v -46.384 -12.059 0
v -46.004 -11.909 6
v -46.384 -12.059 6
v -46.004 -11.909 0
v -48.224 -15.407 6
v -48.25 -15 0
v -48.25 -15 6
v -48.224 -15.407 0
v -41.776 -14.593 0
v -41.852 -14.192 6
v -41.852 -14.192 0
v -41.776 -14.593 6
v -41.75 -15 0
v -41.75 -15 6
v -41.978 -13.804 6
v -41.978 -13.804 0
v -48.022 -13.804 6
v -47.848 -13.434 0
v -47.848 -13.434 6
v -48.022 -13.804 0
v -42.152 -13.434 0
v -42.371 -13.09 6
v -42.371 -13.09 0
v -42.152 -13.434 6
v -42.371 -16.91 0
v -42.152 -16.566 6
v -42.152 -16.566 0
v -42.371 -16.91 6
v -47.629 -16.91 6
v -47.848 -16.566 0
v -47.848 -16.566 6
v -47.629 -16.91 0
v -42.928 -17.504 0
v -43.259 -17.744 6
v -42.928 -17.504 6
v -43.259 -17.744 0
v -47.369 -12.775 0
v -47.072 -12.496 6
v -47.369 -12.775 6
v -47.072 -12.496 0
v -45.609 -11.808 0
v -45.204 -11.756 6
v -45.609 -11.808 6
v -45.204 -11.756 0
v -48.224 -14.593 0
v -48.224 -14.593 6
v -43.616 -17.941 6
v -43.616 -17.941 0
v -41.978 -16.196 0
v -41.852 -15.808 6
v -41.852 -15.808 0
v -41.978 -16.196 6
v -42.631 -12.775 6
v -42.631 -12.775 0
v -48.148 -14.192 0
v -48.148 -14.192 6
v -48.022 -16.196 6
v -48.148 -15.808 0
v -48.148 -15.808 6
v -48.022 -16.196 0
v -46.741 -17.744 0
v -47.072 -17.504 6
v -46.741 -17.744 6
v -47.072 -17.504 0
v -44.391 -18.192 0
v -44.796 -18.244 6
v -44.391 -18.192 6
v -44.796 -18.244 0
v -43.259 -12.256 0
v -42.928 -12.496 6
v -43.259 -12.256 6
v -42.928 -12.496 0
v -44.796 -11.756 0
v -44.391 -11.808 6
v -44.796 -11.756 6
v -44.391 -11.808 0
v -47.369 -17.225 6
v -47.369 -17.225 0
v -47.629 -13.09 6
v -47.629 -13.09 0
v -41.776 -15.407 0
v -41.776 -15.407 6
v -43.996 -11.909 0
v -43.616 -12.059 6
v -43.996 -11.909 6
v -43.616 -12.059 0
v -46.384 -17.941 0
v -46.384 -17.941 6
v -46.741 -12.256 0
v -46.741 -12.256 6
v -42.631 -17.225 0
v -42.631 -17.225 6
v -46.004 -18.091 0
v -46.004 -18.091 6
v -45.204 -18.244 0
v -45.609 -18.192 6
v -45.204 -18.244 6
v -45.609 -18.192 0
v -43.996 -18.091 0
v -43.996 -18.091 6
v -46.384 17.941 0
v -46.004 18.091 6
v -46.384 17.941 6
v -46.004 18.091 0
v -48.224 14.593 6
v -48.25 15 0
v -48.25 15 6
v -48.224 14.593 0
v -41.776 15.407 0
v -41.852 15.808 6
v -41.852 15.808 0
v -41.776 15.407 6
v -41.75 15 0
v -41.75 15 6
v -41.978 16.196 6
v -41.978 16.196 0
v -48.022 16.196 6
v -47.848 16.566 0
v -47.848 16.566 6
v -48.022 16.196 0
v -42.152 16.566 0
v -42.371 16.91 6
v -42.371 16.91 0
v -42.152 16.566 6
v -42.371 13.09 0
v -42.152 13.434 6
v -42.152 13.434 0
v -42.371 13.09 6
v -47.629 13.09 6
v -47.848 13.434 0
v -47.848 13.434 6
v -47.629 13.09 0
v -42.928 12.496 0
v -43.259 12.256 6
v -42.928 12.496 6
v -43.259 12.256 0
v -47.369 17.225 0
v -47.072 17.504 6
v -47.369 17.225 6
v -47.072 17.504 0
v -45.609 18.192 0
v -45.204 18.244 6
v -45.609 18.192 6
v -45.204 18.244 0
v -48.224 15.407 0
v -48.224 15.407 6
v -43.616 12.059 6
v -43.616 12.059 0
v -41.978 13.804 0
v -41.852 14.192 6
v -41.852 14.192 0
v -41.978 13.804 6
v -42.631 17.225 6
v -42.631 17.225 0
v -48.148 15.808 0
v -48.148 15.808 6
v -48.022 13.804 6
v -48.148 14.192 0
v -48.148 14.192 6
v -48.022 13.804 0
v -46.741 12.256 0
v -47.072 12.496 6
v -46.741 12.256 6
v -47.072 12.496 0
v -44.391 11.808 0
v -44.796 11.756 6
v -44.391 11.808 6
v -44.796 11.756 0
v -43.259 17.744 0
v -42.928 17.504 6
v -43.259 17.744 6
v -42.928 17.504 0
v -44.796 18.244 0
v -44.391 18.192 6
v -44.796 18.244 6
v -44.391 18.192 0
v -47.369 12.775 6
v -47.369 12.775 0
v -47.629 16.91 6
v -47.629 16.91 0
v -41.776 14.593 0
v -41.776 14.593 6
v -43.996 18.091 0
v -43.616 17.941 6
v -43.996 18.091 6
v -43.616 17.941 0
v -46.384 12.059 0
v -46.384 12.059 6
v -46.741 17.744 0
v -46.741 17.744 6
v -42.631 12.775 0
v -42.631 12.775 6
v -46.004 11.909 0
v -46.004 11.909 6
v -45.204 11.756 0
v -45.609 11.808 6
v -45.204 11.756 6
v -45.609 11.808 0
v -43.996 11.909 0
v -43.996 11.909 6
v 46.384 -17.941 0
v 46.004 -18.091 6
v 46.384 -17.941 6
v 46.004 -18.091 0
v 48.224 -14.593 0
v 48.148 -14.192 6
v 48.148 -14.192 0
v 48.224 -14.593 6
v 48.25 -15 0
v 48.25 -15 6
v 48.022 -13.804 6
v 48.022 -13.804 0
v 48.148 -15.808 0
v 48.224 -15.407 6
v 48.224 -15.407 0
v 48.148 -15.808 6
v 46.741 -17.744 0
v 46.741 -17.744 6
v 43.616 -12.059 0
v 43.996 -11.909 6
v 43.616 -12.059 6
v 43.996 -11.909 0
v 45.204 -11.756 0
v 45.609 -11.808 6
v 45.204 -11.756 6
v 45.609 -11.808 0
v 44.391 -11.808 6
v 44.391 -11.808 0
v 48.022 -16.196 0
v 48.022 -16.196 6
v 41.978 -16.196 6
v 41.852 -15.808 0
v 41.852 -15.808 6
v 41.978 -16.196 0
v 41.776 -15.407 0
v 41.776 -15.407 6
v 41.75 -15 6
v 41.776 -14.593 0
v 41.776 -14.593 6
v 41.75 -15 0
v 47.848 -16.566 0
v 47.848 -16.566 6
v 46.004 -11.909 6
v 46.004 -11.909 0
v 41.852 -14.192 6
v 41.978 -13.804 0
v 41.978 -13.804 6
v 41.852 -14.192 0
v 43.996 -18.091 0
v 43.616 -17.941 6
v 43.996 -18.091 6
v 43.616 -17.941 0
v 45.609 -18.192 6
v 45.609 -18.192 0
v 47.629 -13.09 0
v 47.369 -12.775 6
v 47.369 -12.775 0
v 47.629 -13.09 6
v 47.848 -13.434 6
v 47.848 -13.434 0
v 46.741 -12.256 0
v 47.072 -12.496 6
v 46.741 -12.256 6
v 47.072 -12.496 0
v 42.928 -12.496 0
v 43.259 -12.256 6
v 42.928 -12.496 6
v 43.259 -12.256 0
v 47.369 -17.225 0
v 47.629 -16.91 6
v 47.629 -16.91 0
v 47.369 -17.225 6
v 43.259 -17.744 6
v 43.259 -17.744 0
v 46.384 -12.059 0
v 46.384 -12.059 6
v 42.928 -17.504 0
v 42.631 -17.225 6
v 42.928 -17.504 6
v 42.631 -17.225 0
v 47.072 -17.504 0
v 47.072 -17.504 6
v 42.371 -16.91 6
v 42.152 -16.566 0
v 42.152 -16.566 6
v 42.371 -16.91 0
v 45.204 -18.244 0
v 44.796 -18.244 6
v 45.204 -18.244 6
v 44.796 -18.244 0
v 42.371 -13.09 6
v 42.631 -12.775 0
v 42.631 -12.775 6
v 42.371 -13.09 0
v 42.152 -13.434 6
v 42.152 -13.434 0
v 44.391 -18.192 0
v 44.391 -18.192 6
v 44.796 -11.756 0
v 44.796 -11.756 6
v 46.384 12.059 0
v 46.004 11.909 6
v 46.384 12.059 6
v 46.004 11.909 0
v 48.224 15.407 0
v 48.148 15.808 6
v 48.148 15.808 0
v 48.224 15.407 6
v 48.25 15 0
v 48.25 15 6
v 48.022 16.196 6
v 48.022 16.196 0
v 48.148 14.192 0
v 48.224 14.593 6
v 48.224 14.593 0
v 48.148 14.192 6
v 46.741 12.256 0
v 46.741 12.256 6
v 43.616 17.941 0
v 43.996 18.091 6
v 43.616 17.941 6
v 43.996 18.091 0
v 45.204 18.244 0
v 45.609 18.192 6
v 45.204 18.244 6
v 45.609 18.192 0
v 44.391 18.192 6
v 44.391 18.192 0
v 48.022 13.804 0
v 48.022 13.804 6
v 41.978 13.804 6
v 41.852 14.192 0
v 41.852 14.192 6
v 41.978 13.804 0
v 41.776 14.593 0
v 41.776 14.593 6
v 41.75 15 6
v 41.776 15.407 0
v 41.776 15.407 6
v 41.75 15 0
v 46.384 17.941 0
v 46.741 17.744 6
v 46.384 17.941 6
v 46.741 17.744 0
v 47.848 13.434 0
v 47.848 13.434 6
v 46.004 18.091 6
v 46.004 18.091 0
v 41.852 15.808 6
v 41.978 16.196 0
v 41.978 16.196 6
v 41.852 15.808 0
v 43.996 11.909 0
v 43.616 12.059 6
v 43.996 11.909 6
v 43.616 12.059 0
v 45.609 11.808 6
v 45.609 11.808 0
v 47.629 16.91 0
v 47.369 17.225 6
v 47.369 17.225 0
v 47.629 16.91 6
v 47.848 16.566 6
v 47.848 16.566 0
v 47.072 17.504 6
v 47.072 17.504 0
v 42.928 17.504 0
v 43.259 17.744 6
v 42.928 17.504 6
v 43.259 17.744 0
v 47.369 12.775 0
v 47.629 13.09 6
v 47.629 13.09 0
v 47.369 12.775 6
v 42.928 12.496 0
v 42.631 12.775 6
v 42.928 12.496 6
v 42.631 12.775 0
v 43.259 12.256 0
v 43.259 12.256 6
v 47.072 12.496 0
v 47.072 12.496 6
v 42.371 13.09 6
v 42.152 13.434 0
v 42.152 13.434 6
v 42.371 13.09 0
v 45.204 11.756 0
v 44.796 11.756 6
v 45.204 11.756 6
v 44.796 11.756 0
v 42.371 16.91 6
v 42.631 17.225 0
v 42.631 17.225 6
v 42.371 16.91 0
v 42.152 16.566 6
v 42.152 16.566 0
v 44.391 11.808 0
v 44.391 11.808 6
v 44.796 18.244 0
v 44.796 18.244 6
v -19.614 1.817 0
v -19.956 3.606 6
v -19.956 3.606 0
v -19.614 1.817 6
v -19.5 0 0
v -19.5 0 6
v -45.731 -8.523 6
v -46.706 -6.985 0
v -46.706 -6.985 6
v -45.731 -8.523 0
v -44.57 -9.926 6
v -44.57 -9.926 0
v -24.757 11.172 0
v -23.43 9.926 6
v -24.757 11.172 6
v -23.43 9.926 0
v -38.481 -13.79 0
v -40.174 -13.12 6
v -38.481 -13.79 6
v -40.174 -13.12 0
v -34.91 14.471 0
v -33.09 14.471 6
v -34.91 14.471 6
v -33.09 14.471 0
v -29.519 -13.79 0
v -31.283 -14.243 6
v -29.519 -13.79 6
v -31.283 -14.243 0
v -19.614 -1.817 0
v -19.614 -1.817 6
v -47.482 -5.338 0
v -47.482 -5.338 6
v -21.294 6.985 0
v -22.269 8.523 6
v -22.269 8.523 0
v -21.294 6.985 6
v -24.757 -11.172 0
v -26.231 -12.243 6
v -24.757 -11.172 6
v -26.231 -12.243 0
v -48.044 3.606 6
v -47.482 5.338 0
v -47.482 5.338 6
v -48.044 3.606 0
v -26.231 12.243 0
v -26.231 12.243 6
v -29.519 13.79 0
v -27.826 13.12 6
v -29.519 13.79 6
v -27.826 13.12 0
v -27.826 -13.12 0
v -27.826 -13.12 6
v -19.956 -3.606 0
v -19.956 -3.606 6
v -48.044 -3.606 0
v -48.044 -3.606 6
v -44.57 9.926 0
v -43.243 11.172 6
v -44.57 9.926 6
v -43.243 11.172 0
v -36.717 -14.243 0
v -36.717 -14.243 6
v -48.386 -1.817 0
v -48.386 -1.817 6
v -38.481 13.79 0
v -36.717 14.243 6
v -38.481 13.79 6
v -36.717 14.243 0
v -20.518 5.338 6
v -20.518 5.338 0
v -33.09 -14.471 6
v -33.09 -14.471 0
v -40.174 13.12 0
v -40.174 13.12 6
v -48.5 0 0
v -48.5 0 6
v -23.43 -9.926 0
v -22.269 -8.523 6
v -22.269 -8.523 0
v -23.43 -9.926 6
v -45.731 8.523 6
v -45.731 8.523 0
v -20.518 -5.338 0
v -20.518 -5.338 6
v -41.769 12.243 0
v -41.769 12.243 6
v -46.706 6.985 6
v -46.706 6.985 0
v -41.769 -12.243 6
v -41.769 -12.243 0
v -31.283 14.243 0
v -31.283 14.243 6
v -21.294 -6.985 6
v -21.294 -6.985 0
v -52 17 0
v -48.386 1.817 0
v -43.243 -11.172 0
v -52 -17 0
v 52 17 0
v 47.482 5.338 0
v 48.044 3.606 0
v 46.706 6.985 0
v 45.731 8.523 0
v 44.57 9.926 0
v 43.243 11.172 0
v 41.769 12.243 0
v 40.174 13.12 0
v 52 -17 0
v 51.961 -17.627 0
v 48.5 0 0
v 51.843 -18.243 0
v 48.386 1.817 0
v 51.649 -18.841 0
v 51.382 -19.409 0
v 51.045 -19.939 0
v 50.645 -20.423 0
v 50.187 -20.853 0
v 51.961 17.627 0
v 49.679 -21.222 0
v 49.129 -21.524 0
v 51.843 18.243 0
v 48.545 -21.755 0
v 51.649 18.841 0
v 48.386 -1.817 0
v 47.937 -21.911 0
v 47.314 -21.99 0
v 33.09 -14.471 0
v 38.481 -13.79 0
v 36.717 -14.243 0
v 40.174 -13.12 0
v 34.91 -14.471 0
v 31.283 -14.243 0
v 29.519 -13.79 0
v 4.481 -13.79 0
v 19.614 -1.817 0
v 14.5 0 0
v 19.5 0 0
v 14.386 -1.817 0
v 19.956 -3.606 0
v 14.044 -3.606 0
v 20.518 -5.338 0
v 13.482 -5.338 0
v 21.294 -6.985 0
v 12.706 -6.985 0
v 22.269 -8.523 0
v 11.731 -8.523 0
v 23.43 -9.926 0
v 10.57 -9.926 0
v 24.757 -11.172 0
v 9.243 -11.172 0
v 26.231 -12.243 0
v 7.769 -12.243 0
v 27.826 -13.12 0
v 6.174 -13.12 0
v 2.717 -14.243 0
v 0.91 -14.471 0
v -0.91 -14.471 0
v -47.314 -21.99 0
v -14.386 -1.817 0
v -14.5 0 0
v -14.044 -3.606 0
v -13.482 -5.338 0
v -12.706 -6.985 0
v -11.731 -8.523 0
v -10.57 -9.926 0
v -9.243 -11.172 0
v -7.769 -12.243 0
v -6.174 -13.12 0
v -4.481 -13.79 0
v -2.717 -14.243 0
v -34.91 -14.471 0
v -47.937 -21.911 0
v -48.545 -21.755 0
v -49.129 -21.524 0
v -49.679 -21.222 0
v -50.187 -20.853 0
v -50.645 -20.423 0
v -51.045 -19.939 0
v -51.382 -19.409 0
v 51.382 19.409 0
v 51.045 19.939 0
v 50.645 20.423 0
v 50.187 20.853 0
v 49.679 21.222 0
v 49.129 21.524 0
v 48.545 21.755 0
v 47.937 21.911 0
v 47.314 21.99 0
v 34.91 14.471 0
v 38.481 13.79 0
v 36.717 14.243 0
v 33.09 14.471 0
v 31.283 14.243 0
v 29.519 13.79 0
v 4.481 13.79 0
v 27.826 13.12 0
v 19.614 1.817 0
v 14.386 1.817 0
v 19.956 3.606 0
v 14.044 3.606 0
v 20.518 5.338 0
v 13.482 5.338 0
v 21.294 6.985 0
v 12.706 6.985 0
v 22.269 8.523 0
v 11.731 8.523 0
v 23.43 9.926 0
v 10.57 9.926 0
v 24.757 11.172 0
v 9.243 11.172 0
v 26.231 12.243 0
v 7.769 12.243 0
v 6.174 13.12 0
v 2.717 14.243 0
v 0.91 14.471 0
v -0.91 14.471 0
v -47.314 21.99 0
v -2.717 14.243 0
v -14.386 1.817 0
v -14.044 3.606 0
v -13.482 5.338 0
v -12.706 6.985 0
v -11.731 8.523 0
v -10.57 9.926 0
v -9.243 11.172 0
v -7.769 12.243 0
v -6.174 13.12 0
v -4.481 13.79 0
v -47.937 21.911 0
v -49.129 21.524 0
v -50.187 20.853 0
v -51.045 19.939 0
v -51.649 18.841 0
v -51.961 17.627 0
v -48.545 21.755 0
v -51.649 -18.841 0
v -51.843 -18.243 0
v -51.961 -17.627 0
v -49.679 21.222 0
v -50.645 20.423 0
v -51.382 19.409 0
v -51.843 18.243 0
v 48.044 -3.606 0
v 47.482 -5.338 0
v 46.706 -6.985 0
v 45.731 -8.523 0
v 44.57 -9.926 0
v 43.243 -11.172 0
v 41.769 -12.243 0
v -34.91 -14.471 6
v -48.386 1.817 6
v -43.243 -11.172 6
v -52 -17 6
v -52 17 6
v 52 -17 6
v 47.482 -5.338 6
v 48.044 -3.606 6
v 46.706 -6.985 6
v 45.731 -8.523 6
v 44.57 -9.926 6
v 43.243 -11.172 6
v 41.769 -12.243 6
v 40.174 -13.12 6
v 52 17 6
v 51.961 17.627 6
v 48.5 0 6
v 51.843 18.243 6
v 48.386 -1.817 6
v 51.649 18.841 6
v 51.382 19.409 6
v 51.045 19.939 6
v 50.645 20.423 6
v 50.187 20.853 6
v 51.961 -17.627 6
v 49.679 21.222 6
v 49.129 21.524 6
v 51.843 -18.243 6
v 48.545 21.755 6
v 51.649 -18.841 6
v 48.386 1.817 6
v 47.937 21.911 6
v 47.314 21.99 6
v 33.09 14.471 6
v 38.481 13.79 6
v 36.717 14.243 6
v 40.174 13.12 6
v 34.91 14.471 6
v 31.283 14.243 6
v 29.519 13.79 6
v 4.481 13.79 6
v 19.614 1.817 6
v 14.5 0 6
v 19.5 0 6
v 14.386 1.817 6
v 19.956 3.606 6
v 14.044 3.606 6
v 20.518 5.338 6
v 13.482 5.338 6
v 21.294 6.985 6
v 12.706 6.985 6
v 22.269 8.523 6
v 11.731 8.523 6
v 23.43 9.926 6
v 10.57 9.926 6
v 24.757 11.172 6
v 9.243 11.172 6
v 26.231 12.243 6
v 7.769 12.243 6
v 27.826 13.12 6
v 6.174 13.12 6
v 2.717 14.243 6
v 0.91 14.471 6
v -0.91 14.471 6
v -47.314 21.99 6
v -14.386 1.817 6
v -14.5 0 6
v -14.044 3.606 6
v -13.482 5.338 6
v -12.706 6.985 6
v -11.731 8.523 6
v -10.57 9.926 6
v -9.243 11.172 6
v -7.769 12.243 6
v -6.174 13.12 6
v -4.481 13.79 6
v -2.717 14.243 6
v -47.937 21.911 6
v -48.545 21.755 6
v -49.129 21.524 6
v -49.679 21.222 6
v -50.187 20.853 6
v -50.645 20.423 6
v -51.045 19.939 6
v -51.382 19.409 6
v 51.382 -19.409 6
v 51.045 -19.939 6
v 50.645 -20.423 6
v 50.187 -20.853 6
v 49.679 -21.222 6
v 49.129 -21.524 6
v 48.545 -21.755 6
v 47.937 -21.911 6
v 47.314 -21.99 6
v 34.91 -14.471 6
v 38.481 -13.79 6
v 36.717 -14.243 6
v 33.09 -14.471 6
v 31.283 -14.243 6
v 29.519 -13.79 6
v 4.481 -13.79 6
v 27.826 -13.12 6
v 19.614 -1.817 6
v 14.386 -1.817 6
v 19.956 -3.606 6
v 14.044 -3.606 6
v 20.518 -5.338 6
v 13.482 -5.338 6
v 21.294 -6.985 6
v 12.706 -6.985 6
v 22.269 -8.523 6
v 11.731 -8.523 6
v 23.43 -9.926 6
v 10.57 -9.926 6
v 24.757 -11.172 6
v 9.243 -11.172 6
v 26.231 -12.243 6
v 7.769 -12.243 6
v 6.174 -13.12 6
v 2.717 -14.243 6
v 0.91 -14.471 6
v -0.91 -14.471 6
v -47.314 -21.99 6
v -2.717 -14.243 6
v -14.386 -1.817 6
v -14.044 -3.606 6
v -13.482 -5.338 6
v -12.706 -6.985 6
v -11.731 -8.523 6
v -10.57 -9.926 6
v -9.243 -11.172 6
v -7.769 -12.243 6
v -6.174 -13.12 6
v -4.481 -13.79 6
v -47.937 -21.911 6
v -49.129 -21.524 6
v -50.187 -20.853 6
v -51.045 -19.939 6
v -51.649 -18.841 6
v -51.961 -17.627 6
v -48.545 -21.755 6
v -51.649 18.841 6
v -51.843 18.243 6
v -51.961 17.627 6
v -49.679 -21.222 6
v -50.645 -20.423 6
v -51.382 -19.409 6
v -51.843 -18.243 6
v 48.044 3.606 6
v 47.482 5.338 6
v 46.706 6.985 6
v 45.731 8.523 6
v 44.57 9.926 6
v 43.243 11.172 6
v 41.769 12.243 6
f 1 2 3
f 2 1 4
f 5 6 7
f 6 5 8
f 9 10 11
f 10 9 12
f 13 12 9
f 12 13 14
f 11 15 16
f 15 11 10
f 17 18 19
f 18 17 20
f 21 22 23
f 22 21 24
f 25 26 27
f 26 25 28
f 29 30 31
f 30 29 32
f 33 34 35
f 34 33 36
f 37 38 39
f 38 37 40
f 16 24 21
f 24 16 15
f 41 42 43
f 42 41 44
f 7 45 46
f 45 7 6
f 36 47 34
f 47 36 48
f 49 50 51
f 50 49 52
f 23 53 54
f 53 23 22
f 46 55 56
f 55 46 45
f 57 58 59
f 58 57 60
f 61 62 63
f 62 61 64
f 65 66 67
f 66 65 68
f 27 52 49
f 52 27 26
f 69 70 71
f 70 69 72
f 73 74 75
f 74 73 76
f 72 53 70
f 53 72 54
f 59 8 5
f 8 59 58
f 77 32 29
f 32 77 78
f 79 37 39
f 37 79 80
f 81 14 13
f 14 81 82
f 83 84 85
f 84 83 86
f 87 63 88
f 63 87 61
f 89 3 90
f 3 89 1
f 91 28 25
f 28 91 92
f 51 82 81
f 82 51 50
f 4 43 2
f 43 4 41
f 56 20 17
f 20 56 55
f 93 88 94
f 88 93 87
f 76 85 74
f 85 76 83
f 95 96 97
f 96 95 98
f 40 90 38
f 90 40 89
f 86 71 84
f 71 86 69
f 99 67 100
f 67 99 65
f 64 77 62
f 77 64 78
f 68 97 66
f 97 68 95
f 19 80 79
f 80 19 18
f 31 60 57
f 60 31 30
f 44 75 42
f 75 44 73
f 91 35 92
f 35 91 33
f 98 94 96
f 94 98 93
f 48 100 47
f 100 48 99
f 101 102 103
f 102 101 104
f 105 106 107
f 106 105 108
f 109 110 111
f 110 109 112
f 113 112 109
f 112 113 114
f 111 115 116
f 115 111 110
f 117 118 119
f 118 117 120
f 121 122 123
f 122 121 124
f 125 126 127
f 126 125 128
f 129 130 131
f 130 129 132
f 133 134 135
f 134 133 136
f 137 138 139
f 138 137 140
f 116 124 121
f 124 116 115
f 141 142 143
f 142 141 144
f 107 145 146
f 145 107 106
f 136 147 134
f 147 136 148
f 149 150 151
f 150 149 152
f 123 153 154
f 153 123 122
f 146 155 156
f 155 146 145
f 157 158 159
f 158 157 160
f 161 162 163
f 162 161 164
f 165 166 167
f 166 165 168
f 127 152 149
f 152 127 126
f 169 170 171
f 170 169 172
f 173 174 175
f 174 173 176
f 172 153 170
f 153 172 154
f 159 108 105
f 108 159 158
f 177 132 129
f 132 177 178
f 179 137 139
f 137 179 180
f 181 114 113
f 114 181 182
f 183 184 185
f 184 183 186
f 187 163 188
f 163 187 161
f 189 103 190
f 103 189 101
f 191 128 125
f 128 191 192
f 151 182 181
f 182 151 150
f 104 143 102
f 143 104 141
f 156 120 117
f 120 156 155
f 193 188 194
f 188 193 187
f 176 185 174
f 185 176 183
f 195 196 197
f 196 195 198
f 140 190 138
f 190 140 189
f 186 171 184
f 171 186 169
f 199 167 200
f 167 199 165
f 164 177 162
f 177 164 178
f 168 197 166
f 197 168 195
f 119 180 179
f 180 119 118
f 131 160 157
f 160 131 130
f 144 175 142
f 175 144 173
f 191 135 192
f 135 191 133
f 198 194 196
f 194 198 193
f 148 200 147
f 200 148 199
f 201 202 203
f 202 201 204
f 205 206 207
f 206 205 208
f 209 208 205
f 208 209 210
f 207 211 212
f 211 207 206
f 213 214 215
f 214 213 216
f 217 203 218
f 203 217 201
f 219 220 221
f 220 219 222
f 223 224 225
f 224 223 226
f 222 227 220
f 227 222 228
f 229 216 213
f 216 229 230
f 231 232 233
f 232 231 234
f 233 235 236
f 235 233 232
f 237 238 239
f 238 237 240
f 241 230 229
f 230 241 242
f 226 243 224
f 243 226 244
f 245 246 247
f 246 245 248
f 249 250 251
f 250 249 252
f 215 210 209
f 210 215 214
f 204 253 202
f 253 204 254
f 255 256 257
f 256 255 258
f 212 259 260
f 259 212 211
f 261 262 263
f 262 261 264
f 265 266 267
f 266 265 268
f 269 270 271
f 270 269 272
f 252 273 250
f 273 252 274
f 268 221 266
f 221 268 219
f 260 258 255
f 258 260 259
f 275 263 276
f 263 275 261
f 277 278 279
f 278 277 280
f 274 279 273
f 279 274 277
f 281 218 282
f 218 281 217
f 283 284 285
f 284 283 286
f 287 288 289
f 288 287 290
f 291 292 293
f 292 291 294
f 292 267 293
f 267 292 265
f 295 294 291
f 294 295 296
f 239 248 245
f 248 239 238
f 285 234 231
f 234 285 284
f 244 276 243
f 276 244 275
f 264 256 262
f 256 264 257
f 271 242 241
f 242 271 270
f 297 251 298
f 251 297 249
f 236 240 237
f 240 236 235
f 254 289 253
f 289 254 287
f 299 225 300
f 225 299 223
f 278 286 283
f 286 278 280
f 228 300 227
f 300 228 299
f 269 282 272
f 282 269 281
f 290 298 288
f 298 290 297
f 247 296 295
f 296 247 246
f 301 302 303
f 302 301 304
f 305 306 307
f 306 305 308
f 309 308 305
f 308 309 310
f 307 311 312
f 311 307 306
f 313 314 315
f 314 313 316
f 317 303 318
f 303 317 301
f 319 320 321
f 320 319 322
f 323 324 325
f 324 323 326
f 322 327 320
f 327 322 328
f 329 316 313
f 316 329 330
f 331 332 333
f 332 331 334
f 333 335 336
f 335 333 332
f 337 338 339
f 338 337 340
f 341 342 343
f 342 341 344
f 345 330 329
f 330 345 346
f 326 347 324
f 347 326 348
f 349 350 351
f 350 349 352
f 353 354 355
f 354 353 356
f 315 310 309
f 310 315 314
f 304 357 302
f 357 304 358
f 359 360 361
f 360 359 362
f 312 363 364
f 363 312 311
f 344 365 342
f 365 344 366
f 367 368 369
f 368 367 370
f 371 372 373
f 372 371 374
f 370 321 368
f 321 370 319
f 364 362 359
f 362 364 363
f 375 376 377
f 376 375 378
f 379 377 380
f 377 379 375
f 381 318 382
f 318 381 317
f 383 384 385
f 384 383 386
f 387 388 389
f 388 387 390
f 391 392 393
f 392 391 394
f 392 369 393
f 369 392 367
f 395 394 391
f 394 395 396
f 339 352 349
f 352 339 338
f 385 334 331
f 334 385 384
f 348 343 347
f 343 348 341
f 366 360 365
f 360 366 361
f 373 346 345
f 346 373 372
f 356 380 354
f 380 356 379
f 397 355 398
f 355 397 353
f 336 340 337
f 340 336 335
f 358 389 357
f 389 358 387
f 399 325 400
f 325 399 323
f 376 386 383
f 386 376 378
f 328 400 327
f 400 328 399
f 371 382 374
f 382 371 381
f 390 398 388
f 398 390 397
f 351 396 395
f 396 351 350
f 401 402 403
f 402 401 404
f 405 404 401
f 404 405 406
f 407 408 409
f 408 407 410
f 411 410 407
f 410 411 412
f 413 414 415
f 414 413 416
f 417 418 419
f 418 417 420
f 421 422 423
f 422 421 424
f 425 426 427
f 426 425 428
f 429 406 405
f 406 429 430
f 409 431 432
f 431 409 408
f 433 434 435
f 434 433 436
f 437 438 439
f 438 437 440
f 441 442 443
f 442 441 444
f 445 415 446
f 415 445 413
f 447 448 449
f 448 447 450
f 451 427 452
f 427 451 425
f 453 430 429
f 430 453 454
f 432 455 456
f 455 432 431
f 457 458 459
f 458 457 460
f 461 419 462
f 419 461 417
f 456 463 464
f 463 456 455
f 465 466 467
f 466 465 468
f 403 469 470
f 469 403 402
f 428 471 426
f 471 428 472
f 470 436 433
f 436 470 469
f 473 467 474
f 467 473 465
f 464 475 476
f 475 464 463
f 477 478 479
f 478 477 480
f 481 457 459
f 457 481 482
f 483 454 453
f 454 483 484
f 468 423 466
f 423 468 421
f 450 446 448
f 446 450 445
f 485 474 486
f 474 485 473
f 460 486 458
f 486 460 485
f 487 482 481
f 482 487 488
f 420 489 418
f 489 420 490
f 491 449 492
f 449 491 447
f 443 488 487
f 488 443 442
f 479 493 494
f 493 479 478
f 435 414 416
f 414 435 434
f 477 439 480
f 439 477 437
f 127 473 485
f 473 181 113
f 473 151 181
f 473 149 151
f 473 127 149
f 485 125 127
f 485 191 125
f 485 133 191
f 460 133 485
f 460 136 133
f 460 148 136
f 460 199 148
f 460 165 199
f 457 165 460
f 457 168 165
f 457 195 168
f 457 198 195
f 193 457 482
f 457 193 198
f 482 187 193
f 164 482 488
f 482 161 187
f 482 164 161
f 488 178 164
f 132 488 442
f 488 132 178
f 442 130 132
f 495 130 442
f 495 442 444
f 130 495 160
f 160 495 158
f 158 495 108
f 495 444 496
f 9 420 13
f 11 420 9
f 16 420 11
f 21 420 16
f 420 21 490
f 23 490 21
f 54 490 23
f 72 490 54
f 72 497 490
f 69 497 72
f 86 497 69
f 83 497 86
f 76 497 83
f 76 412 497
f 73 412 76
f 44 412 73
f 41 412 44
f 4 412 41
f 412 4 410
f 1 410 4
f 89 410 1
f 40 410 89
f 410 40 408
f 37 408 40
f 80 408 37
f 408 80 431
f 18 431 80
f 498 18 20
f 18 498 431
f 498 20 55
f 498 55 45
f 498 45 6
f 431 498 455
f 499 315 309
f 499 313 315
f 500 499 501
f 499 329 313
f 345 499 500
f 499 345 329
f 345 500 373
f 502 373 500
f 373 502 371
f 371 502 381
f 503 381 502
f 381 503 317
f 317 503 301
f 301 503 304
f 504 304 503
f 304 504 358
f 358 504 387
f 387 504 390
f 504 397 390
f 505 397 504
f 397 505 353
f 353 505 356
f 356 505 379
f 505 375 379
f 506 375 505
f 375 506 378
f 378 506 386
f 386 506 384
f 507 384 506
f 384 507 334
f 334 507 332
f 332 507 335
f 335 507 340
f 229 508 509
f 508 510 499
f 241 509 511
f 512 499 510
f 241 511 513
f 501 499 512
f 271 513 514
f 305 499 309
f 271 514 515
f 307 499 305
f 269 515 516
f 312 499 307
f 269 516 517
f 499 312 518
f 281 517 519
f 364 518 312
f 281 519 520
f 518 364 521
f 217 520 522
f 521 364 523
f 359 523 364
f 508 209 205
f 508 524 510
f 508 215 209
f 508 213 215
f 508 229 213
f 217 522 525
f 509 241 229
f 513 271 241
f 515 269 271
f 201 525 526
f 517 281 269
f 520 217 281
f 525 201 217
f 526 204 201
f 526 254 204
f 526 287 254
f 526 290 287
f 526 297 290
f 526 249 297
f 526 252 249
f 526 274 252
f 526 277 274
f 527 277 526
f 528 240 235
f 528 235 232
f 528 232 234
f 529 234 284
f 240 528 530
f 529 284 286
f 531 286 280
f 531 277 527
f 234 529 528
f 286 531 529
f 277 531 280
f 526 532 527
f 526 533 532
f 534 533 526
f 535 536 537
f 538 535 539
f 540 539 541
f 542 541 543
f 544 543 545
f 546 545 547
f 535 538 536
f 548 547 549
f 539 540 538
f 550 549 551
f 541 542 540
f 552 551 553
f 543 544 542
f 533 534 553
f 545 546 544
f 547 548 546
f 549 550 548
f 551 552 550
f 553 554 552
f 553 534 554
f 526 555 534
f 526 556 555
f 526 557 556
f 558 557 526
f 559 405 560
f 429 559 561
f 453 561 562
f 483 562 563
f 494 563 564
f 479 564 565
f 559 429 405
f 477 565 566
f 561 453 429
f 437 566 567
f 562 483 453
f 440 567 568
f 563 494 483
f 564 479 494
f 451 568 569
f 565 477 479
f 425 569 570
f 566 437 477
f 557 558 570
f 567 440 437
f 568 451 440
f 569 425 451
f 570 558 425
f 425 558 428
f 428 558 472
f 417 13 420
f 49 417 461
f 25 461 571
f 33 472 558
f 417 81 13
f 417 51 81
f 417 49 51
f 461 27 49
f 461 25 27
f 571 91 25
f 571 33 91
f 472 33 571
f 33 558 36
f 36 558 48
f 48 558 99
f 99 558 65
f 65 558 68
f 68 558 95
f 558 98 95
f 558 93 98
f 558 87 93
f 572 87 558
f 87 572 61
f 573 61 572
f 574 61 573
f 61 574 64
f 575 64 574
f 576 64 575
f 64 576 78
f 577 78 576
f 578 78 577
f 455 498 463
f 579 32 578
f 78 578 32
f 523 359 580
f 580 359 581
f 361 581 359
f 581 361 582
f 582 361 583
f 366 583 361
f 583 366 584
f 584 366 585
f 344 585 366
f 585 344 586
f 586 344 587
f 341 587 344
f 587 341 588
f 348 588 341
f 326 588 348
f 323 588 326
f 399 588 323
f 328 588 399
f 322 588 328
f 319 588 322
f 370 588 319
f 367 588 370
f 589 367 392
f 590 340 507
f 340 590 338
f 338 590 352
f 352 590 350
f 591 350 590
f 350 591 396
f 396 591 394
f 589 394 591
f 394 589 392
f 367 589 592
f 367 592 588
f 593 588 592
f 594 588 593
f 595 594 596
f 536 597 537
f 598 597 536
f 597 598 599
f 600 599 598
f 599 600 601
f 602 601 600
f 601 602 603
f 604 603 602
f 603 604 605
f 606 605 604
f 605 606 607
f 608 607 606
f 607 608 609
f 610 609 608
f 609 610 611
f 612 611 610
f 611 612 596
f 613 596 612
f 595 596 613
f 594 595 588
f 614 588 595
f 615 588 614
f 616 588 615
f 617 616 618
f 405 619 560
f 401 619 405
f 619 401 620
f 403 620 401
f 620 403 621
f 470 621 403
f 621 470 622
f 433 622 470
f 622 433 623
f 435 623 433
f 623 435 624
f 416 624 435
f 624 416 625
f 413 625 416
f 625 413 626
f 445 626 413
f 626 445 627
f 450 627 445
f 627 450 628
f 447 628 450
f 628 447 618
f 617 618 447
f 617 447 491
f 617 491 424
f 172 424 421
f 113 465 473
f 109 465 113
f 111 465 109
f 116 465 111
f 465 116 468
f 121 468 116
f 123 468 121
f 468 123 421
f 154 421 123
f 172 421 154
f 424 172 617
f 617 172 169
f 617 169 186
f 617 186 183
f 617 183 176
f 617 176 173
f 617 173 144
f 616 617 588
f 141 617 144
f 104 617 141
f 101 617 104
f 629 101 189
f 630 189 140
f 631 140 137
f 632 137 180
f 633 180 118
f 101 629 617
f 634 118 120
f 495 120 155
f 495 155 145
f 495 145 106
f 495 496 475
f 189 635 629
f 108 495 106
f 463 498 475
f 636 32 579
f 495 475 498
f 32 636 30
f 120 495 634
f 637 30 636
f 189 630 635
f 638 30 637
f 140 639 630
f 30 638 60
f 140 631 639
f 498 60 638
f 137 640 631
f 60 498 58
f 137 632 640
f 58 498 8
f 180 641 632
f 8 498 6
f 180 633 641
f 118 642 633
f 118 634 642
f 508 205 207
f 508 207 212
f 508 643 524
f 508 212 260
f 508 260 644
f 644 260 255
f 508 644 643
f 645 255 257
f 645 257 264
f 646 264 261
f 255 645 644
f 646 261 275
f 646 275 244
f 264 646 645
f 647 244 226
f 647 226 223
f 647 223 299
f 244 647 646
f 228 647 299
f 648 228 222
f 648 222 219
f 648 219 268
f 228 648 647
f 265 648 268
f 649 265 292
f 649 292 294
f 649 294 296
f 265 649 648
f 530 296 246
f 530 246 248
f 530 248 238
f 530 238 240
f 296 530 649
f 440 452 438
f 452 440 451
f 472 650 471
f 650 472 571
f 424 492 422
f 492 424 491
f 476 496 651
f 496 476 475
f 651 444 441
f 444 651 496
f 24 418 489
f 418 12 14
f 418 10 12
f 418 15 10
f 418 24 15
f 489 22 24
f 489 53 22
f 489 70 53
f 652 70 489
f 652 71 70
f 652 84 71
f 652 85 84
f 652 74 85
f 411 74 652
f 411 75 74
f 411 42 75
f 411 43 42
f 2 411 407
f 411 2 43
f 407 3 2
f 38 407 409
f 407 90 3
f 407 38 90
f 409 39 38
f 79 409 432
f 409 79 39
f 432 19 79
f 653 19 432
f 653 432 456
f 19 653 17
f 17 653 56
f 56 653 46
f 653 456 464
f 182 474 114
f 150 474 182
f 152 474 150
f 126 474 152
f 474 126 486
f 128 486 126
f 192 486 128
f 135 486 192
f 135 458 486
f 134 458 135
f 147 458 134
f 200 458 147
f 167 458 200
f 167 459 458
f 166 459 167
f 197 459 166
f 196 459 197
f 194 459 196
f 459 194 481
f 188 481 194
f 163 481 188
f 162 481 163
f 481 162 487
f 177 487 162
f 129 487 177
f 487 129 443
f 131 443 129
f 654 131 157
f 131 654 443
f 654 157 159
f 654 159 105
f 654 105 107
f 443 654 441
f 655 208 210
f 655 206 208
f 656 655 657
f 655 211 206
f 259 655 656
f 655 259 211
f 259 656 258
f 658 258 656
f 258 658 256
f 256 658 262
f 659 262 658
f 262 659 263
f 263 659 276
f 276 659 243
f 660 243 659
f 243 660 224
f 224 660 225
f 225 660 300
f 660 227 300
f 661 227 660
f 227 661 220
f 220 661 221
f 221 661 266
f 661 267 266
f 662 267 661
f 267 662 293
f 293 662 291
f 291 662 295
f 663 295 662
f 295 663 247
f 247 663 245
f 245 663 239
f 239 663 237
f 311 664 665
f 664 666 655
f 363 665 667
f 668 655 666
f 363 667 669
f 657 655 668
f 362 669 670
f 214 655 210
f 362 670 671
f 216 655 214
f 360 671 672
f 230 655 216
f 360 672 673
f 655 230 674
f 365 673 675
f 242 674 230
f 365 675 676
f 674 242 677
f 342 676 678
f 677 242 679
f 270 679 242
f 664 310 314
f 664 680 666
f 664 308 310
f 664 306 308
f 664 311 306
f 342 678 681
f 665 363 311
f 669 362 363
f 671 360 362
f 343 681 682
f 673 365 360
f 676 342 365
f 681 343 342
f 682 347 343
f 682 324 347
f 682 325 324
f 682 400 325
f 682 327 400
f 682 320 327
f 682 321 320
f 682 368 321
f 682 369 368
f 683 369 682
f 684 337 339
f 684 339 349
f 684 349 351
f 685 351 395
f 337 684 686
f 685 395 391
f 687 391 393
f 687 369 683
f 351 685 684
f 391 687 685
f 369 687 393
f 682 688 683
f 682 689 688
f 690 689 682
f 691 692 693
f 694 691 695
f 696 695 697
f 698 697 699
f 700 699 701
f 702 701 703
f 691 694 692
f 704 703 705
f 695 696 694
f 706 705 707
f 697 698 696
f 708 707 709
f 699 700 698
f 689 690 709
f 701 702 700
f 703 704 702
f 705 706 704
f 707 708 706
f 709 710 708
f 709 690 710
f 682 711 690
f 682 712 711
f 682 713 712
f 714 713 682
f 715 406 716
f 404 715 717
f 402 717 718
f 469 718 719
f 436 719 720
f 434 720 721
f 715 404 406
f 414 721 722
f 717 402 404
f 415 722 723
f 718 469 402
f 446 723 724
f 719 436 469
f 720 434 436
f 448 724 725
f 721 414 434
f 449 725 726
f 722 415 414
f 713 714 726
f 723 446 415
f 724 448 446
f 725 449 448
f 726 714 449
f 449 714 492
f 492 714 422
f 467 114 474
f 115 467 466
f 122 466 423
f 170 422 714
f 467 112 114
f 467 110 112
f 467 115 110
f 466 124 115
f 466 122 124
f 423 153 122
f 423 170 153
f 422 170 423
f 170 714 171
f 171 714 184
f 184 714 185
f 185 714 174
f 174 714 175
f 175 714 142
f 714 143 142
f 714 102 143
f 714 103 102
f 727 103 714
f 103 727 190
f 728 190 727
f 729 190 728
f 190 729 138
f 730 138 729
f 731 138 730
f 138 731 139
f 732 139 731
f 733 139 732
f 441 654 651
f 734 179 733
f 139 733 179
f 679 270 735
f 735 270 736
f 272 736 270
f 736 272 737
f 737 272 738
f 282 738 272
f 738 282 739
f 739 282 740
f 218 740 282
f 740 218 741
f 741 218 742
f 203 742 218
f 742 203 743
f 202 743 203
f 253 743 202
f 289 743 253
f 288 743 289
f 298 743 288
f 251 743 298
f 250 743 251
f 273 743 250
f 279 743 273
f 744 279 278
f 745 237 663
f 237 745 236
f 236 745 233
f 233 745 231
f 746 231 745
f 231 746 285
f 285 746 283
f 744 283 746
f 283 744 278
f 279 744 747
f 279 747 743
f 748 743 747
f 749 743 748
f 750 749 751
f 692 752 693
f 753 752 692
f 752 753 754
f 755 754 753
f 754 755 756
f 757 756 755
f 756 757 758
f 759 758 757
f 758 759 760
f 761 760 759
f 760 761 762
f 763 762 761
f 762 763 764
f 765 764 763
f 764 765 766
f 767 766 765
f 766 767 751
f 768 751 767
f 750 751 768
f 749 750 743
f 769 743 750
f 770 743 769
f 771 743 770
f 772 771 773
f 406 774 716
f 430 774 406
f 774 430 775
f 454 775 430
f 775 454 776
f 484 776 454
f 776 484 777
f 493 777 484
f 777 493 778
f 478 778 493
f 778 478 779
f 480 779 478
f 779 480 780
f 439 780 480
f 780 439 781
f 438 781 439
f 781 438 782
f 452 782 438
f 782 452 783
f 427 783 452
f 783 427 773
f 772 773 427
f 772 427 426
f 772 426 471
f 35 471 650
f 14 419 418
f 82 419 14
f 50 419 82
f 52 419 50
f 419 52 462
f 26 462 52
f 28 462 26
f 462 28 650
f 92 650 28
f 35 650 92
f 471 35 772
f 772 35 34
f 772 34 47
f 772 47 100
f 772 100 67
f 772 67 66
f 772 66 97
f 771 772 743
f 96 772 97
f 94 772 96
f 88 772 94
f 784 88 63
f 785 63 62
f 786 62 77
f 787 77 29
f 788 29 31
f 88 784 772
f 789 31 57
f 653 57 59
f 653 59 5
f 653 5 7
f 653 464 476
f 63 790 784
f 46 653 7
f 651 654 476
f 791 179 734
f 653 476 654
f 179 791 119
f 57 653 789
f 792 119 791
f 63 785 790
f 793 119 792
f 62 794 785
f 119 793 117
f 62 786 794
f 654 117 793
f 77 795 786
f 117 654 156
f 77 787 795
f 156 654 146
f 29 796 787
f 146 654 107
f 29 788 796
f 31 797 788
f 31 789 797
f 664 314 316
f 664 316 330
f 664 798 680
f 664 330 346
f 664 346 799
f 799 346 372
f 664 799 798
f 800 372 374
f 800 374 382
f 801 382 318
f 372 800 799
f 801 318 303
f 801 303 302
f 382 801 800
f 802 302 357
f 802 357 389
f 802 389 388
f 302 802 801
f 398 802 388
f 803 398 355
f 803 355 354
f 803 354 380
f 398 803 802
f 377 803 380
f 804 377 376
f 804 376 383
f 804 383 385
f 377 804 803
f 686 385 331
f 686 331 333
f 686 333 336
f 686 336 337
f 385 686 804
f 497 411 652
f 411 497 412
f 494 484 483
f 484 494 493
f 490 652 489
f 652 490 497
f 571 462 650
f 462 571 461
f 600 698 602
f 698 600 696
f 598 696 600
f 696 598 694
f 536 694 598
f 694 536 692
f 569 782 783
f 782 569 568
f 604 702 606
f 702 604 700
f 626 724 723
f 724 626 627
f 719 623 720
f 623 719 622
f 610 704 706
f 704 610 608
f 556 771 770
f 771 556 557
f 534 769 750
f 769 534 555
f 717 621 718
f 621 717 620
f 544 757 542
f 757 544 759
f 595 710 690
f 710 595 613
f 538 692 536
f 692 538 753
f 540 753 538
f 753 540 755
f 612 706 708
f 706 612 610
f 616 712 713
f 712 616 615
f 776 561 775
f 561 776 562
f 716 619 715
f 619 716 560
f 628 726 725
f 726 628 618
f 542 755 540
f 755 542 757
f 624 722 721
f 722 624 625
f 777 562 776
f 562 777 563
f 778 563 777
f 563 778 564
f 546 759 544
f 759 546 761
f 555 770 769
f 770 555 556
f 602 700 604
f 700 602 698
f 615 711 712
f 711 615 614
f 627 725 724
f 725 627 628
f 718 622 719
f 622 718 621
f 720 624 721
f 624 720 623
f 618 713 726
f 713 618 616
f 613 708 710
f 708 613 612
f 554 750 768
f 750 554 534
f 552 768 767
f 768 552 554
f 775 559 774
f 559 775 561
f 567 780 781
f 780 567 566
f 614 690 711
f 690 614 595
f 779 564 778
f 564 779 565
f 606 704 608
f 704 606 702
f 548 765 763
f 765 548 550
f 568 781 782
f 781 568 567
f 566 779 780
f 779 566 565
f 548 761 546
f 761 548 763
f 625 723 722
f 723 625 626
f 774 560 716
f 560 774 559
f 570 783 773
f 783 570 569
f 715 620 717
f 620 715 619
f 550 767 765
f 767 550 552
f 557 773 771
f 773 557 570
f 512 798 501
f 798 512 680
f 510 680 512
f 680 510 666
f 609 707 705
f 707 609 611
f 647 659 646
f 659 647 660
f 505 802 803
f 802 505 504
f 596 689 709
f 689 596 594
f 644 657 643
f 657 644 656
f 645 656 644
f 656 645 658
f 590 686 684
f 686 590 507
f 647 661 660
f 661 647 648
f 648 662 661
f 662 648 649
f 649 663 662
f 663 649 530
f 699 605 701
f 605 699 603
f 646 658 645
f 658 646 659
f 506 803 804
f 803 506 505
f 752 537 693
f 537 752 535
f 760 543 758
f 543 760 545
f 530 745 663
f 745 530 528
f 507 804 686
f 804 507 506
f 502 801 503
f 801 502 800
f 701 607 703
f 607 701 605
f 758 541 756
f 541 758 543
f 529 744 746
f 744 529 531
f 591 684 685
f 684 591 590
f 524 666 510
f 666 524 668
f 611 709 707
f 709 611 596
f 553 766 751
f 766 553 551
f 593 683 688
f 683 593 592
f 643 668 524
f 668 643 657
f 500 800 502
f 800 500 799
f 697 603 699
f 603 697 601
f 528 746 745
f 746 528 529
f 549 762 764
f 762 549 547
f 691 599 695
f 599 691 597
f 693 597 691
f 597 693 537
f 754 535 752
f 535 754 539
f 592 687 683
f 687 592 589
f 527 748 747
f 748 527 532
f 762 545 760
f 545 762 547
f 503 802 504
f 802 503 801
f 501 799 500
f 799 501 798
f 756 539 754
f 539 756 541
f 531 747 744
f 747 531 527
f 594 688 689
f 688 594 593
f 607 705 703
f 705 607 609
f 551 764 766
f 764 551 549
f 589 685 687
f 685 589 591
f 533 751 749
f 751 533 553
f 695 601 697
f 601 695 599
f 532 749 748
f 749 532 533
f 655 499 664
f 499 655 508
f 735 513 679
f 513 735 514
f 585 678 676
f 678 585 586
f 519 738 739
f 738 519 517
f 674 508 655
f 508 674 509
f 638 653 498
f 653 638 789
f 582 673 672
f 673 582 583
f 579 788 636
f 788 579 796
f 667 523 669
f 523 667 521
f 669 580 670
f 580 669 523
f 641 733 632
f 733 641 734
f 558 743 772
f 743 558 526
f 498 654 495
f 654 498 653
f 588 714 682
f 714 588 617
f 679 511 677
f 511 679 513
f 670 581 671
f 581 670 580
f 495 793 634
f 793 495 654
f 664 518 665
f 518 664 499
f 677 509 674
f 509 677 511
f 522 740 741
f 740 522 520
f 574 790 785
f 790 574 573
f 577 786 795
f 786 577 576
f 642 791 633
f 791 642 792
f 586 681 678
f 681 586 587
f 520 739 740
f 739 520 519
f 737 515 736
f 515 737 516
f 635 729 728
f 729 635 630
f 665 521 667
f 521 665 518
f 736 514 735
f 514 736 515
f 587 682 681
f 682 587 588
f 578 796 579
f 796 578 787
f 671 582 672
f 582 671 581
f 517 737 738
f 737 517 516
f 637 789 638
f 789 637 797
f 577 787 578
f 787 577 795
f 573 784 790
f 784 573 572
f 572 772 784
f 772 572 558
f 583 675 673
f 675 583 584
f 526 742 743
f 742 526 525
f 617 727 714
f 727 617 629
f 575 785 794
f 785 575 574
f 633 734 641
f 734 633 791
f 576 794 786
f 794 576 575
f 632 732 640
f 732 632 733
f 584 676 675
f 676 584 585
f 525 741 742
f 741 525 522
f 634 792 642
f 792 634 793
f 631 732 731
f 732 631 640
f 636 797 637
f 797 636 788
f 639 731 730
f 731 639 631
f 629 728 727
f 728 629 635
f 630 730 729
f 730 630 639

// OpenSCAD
$fn = 50;

difference() {
	union() {
		hull() {
			translate(v = [-47.0, 17.0, 0]) {
				cylinder(h = 6, r = 5);
			}
			translate(v = [47.0, 17.0, 0]) {
				cylinder(h = 6, r = 5);
			}
			translate(v = [-47.0, -17.0, 0]) {
				cylinder(h = 6, r = 5);
			}
			translate(v = [47.0, -17.0, 0]) {
				cylinder(h = 6, r = 5);
			}
		}
	}
	union() {
		translate(v = [-45.0, -15.0, -100.0]) {
			cylinder(h = 200, r = 3.25);
		}
		translate(v = [-45.0, 15.0, -100.0]) {
			cylinder(h = 200, r = 3.25);
		}
		translate(v = [45.0, -15.0, -100.0]) {
			cylinder(h = 200, r = 3.25);
		}
		translate(v = [45.0, 15.0, -100.0]) {
			cylinder(h = 200, r = 3.25);
		}
		translate(v = [-45.0, -15.0, -100.0]) {
			cylinder(h = 200, r = 1.8);
		}
		translate(v = [-45.0, 15.0, -100.0]) {
			cylinder(h = 200, r = 1.8);
		}
		translate(v = [45.0, -15.0, -100.0]) {
			cylinder(h = 200, r = 1.8);
		}
		translate(v = [45.0, 15.0, -100.0]) {
			cylinder(h = 200, r = 1.8);
		}
		translate(v = [-34.0, 0, 0.0]) {
			cylinder(h = 6, r = 14.5);
		}
		cylinder(h = 6, r = 14.5);
		translate(v = [34.0, 0, 0.0]) {
			cylinder(h = 6, r = 14.5);
		}
	}
}
